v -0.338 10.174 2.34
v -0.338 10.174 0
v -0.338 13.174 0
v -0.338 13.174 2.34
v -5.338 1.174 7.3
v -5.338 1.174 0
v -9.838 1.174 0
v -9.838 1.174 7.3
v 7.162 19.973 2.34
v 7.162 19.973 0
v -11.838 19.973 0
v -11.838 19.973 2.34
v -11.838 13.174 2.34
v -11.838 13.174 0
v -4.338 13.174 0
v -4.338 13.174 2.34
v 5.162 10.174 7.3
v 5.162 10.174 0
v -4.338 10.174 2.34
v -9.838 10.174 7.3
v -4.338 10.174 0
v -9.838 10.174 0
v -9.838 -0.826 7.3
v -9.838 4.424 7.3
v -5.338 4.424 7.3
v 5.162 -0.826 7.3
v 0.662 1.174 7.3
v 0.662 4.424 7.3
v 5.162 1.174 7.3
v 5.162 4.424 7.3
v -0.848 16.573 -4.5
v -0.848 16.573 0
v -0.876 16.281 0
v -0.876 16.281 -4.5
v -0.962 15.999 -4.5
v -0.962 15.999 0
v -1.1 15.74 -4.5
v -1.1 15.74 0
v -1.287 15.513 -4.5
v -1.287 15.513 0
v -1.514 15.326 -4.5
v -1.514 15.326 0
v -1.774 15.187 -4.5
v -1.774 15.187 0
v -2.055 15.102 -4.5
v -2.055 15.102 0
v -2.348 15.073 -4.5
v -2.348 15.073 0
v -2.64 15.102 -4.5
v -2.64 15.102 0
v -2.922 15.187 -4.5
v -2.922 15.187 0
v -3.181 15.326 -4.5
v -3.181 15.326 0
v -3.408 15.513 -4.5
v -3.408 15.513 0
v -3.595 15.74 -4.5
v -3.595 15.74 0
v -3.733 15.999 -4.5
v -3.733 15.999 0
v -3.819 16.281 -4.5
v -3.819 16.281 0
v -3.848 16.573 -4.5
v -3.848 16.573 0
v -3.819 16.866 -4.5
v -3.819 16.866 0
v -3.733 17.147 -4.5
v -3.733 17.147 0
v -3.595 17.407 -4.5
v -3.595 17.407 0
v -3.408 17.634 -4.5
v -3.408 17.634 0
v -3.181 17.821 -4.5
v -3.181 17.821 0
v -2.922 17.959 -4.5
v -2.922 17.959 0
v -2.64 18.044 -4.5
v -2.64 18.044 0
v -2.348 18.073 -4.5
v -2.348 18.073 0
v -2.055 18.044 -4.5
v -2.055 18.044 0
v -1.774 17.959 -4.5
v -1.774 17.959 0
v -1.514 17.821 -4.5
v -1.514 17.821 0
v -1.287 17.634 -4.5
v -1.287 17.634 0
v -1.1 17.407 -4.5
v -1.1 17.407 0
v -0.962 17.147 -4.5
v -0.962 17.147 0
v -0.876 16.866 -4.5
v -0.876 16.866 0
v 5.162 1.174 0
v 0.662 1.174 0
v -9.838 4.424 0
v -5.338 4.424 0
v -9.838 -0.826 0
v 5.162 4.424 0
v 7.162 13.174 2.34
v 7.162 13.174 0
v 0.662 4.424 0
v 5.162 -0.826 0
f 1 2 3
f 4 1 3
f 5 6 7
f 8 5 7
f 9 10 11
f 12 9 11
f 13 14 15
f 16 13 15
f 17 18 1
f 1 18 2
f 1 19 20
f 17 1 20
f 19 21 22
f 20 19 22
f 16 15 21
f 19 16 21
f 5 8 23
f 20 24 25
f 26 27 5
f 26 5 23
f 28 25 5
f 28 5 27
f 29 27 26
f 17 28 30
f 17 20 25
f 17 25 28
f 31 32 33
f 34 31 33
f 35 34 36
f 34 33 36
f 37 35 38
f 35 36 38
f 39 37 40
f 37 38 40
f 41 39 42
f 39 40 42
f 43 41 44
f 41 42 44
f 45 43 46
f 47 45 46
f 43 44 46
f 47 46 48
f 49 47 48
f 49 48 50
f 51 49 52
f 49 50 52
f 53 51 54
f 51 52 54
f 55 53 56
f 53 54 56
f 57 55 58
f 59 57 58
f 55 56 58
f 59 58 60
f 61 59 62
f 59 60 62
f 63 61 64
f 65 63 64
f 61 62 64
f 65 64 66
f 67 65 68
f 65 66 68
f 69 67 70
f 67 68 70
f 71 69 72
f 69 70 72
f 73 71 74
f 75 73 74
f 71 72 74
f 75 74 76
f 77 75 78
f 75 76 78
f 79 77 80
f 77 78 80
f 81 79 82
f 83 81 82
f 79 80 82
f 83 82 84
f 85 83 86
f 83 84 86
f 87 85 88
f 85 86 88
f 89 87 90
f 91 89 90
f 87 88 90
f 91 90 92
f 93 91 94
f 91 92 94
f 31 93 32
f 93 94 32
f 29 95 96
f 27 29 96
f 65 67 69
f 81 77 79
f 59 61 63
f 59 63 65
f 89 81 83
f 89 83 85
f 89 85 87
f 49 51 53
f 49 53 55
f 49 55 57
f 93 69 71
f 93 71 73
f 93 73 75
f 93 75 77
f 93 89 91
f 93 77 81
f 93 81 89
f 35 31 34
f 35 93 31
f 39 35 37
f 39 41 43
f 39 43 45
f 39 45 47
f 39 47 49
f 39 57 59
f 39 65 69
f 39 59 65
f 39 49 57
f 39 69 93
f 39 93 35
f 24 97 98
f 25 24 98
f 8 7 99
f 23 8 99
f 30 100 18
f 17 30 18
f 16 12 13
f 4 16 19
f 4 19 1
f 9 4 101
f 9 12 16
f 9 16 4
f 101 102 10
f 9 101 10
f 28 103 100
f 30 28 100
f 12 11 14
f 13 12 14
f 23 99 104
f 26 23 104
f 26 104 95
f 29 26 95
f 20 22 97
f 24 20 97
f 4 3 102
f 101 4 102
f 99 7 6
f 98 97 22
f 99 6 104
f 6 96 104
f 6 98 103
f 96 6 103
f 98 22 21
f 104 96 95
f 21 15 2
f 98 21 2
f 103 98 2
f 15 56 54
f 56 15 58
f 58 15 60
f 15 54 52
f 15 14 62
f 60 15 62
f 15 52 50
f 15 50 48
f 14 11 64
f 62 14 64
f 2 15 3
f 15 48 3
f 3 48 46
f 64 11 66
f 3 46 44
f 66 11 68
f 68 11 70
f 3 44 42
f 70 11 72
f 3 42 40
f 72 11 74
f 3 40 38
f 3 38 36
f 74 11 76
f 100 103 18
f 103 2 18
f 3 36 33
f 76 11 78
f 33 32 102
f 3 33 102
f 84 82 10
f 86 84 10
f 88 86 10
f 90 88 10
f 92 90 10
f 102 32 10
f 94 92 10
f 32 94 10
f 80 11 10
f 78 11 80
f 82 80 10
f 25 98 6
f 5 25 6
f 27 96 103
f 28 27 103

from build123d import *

# Parameters (mm, degrees)
F1_DEPTH = 2.34
F2_DEPTH = 7.3
F3_R     = 1.5
F4_DEPTH = 4.5


with BuildPart() as f1:
    # F0 (on Top) → F1 (new body)
    with BuildSketch(Plane.XY):
        Polygon((-11.837547, 13.173781), (-4.337547, 13.173781), (-2.337547, 13.173781), (-2.337547, 19.972851), (-11.837547, 19.972851), align=None)
        Polygon((-2.337547, 13.173781), (-0.337547, 13.173781), (7.162453, 13.173781), (7.162453, 19.972851), (-2.337547, 19.972851), align=None)
        Polygon((-4.337547, 13.173781), (-4.337547, 10.173781), (-0.337547, 10.173781), (-0.337547, 13.173781), (-2.337547, 13.173781), align=None)
    extrude(amount=F1_DEPTH)

    # F0 (on Top) → F2 (join)
    with BuildSketch(Plane.XY):
        Polygon((-4.337547, 10.173781), (-9.837547, 10.173781), (-9.837547, 4.423781), (-5.337547, 4.423781), (-5.337547, 1.173781), (-9.837547, 1.173781), (-9.837547, -0.826219), (5.162453, -0.826219), (5.162453, 1.173781), (0.662453, 1.173781), (0.662453, 4.423781), (5.162453, 4.423781), (5.162453, 10.173781), (-0.337547, 10.173781), align=None)
    extrude(amount=F2_DEPTH)

    # F3 (on face) → F4 (join)
    with BuildSketch(Plane(origin=(0, 0, 0), x_dir=(1, 0, 0), z_dir=(0, 0, -1))):
        with Locations((-2.347653, -16.573316)):
            Circle(F3_R)
    extrude(amount=F4_DEPTH)


solid = f1.part
